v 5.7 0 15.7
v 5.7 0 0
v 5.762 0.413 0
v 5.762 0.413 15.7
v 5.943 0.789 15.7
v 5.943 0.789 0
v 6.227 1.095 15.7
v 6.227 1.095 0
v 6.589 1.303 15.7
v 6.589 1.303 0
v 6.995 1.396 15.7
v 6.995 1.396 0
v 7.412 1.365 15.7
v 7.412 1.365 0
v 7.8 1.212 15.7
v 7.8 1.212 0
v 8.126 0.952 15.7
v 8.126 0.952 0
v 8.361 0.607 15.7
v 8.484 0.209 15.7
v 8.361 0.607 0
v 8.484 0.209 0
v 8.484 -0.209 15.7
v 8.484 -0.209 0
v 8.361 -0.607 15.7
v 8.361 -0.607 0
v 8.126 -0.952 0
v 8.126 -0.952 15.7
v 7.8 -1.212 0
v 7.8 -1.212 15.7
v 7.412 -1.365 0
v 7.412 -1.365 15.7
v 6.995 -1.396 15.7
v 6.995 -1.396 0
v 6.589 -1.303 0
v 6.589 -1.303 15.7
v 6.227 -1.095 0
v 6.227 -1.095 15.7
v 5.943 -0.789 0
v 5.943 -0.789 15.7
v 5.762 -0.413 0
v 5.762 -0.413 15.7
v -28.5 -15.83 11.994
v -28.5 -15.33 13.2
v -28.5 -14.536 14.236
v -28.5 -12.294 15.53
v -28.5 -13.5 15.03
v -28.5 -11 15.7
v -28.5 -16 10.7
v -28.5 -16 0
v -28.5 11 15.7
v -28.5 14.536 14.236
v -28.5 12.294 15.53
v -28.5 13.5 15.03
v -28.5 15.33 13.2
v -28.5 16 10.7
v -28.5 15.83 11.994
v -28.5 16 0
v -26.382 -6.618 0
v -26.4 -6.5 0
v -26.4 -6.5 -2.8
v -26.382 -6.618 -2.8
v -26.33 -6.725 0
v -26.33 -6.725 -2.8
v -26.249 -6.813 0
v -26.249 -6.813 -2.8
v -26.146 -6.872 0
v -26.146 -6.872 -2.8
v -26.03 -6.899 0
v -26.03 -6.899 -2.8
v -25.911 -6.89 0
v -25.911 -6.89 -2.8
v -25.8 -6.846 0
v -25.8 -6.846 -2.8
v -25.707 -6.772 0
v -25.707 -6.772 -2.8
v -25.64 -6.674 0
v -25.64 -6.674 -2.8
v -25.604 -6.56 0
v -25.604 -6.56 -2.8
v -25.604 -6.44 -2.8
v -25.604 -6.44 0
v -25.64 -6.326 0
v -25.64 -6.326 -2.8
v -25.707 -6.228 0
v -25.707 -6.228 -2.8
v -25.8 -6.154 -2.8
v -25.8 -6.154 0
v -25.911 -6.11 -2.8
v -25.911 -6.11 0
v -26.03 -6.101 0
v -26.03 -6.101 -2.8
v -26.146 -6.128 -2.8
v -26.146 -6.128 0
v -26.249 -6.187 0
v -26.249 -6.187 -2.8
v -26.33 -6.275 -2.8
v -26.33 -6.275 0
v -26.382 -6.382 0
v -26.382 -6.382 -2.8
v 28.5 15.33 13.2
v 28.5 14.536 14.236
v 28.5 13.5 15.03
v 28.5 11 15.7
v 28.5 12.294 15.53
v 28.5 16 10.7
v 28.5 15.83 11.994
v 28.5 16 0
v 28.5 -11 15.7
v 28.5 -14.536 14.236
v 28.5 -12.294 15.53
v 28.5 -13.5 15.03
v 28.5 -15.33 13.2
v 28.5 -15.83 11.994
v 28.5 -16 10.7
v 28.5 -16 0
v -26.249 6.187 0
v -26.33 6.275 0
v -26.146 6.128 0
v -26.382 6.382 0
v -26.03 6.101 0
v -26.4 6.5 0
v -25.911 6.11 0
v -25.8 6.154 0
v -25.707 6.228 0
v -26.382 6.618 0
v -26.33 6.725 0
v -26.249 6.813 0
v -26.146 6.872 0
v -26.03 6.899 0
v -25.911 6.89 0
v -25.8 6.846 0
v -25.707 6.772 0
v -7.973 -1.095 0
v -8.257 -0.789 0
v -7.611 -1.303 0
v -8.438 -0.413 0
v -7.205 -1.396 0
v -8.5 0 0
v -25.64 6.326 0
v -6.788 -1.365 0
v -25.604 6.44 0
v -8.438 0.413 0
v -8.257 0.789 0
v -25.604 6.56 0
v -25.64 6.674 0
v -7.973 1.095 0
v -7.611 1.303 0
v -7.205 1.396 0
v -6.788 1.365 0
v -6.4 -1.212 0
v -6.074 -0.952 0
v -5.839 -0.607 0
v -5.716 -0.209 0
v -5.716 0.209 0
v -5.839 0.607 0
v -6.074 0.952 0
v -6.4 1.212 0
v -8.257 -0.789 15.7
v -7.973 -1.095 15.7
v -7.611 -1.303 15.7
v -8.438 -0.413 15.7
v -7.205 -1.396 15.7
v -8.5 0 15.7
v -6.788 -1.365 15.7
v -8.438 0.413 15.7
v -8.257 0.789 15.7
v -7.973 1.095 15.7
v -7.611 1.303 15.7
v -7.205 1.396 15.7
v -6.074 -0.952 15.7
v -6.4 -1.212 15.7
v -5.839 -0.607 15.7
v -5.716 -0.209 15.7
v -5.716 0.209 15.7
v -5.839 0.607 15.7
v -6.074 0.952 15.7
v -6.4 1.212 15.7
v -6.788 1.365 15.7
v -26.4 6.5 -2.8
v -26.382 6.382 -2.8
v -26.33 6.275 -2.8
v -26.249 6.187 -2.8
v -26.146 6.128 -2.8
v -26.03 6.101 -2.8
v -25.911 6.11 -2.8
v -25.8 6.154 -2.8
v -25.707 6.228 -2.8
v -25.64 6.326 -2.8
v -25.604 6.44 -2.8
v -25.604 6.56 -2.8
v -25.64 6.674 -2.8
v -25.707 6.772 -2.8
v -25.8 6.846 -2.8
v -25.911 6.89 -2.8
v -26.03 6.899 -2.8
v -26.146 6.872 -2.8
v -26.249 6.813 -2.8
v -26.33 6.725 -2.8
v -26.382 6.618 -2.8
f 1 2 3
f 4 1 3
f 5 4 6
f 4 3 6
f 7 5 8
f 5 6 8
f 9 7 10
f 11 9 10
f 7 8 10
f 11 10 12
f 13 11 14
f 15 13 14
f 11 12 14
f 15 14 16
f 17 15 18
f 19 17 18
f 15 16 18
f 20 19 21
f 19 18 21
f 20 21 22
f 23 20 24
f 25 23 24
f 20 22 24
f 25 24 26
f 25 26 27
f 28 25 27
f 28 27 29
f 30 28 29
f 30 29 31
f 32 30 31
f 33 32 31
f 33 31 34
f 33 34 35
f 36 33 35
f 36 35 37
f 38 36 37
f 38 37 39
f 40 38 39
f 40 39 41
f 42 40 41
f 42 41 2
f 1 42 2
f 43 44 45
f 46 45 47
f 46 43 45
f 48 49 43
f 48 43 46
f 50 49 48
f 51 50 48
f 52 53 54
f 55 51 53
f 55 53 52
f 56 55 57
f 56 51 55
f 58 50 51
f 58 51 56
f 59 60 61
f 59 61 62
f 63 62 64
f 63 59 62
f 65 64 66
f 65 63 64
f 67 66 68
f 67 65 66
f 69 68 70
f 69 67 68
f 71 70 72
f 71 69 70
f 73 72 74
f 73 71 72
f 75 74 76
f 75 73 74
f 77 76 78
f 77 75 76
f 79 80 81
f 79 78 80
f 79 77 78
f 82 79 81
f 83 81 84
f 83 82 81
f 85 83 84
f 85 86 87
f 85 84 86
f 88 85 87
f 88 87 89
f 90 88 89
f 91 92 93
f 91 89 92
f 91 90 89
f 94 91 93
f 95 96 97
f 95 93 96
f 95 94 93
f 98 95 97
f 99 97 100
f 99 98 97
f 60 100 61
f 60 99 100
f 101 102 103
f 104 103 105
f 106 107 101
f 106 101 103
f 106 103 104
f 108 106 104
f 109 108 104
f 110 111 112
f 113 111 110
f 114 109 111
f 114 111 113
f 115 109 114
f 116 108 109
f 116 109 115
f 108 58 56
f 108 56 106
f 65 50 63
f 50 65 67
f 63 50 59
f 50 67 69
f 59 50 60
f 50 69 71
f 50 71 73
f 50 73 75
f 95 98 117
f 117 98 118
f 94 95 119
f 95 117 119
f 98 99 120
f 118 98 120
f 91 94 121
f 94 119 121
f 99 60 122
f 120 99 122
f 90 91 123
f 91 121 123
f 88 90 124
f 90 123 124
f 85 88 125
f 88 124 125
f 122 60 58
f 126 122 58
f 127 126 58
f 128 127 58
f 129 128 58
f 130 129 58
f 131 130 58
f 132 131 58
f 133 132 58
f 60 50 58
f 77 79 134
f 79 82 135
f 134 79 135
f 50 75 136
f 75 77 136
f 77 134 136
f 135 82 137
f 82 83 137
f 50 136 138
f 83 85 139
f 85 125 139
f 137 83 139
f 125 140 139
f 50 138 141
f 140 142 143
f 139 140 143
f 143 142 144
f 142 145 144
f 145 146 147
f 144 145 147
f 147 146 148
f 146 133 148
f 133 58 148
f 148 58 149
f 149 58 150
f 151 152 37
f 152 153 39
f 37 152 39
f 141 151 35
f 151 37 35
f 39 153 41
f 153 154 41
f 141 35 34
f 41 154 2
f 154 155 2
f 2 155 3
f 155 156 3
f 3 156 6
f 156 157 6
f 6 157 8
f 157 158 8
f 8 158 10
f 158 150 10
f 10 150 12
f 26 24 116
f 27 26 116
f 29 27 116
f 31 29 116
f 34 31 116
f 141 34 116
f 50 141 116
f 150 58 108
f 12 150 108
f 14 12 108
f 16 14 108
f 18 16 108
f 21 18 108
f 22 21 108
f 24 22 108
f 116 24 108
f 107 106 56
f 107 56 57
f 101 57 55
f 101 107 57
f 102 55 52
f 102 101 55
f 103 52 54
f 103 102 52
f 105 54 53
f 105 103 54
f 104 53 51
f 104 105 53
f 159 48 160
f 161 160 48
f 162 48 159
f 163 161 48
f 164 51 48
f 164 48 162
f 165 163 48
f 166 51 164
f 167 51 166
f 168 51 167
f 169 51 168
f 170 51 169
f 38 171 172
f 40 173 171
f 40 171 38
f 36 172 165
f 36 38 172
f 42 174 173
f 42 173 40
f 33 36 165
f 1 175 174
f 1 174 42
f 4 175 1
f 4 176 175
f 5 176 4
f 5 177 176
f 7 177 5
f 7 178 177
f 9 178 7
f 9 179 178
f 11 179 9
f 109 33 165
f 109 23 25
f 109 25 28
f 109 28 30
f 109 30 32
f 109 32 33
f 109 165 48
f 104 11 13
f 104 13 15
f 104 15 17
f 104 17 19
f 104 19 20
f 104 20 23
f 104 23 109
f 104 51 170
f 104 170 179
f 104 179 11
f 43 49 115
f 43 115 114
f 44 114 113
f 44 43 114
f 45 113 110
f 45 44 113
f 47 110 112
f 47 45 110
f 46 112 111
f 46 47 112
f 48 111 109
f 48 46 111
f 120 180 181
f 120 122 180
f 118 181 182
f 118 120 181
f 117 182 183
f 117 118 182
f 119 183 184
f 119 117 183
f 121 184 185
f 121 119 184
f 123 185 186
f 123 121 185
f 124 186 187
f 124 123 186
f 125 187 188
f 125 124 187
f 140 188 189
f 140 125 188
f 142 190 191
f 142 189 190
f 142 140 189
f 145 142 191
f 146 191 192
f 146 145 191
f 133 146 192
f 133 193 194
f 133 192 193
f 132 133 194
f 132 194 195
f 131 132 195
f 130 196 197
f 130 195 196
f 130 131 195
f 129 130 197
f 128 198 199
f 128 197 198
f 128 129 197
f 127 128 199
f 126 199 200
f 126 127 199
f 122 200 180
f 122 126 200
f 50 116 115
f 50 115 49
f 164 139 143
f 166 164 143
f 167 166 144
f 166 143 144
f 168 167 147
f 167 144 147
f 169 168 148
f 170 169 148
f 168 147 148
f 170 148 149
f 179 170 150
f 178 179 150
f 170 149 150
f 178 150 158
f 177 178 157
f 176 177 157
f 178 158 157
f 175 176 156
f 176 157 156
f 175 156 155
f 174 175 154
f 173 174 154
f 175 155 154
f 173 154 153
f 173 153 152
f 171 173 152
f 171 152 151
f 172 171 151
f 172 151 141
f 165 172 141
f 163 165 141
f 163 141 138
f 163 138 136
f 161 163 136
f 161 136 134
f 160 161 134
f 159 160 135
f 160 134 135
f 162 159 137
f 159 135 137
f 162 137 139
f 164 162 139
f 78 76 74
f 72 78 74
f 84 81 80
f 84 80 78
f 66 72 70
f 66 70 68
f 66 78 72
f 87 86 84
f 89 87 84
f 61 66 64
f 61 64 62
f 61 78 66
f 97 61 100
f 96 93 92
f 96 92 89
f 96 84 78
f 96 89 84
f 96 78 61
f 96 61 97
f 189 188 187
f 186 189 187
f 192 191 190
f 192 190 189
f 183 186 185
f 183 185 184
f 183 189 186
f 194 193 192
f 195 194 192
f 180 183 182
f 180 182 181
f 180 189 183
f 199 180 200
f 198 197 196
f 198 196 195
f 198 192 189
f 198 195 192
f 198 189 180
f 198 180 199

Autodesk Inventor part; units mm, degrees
ref_plane "YZ Plane" through (0, 0, 0) normal (1, 0, 0) x (0, 1, 0)
ref_plane "XZ Plane" through (0, 0, 0) normal (0, 1, 0) x (-1, 0, 0)
ref_plane "XY Plane" through (0, 0, 0) normal (0, 0, 1) x (1, 0, 0)
sketch "スケッチ1" plane through (0, 0, 0) normal (0, 0, 1) x (1, 0, 0)
  line L0 (-28.5, 16) -> (28.5, 16)
  line L1 (28.5, 16) -> (28.5, -16)
  line L2 (28.5, -16) -> (-28.5, -16)
  line L3 (-28.5, -16) -> (-28.5, 16)
  point P0 (0, 0)
  point P1 (-28.5, 0)
  point P2 (0, 16)
  dimension "d0" = 57
  dimension "d1" = 32
extrude "押し出し1" add sketch "スケッチ1" along normal blind 15.7
fillet "フィレット1" radius 5 2 edges at (0, 16, 15.7) (0, -16, 15.7)
sketch "スケッチ2" plane through (0, 0, 0) normal (0, 0, -1) x (-1, 0, 0)
  line L0 (26, 20.4284) -> (26, -20.6337) construction
  line L1 (0, 0) -> (36.4083, 0) construction
  line L2 (28.5, 16) -> (28.5, -16) construction
  circle A0 centre (26, 6.5) radius 0.4
  circle A1 centre (26, -6.5) radius 0.4
  dimension "d5" = 2.5
  dimension "d6" = 0.8
  dimension "d7" = 13
extrude "押し出し2" add sketch "スケッチ2" along normal blind 2.8
sketch "スケッチ3" plane through (0, 0, 0) normal (0, 0, -1) x (-1, 0, 0)
  circle A0 centre (-7.1, 0) radius 1.4
  circle A1 centre (7.1, 0) radius 1.4
  point P0 (0, 0)
  dimension "d10" = 2.8
  dimension "d11" = 7.1
  dimension "d12" = 7.1
extrude "押し出し3" cut sketch "スケッチ3" against normal through all
equation "\"d12\" = d11"
properties part number "BH321-1P24"
